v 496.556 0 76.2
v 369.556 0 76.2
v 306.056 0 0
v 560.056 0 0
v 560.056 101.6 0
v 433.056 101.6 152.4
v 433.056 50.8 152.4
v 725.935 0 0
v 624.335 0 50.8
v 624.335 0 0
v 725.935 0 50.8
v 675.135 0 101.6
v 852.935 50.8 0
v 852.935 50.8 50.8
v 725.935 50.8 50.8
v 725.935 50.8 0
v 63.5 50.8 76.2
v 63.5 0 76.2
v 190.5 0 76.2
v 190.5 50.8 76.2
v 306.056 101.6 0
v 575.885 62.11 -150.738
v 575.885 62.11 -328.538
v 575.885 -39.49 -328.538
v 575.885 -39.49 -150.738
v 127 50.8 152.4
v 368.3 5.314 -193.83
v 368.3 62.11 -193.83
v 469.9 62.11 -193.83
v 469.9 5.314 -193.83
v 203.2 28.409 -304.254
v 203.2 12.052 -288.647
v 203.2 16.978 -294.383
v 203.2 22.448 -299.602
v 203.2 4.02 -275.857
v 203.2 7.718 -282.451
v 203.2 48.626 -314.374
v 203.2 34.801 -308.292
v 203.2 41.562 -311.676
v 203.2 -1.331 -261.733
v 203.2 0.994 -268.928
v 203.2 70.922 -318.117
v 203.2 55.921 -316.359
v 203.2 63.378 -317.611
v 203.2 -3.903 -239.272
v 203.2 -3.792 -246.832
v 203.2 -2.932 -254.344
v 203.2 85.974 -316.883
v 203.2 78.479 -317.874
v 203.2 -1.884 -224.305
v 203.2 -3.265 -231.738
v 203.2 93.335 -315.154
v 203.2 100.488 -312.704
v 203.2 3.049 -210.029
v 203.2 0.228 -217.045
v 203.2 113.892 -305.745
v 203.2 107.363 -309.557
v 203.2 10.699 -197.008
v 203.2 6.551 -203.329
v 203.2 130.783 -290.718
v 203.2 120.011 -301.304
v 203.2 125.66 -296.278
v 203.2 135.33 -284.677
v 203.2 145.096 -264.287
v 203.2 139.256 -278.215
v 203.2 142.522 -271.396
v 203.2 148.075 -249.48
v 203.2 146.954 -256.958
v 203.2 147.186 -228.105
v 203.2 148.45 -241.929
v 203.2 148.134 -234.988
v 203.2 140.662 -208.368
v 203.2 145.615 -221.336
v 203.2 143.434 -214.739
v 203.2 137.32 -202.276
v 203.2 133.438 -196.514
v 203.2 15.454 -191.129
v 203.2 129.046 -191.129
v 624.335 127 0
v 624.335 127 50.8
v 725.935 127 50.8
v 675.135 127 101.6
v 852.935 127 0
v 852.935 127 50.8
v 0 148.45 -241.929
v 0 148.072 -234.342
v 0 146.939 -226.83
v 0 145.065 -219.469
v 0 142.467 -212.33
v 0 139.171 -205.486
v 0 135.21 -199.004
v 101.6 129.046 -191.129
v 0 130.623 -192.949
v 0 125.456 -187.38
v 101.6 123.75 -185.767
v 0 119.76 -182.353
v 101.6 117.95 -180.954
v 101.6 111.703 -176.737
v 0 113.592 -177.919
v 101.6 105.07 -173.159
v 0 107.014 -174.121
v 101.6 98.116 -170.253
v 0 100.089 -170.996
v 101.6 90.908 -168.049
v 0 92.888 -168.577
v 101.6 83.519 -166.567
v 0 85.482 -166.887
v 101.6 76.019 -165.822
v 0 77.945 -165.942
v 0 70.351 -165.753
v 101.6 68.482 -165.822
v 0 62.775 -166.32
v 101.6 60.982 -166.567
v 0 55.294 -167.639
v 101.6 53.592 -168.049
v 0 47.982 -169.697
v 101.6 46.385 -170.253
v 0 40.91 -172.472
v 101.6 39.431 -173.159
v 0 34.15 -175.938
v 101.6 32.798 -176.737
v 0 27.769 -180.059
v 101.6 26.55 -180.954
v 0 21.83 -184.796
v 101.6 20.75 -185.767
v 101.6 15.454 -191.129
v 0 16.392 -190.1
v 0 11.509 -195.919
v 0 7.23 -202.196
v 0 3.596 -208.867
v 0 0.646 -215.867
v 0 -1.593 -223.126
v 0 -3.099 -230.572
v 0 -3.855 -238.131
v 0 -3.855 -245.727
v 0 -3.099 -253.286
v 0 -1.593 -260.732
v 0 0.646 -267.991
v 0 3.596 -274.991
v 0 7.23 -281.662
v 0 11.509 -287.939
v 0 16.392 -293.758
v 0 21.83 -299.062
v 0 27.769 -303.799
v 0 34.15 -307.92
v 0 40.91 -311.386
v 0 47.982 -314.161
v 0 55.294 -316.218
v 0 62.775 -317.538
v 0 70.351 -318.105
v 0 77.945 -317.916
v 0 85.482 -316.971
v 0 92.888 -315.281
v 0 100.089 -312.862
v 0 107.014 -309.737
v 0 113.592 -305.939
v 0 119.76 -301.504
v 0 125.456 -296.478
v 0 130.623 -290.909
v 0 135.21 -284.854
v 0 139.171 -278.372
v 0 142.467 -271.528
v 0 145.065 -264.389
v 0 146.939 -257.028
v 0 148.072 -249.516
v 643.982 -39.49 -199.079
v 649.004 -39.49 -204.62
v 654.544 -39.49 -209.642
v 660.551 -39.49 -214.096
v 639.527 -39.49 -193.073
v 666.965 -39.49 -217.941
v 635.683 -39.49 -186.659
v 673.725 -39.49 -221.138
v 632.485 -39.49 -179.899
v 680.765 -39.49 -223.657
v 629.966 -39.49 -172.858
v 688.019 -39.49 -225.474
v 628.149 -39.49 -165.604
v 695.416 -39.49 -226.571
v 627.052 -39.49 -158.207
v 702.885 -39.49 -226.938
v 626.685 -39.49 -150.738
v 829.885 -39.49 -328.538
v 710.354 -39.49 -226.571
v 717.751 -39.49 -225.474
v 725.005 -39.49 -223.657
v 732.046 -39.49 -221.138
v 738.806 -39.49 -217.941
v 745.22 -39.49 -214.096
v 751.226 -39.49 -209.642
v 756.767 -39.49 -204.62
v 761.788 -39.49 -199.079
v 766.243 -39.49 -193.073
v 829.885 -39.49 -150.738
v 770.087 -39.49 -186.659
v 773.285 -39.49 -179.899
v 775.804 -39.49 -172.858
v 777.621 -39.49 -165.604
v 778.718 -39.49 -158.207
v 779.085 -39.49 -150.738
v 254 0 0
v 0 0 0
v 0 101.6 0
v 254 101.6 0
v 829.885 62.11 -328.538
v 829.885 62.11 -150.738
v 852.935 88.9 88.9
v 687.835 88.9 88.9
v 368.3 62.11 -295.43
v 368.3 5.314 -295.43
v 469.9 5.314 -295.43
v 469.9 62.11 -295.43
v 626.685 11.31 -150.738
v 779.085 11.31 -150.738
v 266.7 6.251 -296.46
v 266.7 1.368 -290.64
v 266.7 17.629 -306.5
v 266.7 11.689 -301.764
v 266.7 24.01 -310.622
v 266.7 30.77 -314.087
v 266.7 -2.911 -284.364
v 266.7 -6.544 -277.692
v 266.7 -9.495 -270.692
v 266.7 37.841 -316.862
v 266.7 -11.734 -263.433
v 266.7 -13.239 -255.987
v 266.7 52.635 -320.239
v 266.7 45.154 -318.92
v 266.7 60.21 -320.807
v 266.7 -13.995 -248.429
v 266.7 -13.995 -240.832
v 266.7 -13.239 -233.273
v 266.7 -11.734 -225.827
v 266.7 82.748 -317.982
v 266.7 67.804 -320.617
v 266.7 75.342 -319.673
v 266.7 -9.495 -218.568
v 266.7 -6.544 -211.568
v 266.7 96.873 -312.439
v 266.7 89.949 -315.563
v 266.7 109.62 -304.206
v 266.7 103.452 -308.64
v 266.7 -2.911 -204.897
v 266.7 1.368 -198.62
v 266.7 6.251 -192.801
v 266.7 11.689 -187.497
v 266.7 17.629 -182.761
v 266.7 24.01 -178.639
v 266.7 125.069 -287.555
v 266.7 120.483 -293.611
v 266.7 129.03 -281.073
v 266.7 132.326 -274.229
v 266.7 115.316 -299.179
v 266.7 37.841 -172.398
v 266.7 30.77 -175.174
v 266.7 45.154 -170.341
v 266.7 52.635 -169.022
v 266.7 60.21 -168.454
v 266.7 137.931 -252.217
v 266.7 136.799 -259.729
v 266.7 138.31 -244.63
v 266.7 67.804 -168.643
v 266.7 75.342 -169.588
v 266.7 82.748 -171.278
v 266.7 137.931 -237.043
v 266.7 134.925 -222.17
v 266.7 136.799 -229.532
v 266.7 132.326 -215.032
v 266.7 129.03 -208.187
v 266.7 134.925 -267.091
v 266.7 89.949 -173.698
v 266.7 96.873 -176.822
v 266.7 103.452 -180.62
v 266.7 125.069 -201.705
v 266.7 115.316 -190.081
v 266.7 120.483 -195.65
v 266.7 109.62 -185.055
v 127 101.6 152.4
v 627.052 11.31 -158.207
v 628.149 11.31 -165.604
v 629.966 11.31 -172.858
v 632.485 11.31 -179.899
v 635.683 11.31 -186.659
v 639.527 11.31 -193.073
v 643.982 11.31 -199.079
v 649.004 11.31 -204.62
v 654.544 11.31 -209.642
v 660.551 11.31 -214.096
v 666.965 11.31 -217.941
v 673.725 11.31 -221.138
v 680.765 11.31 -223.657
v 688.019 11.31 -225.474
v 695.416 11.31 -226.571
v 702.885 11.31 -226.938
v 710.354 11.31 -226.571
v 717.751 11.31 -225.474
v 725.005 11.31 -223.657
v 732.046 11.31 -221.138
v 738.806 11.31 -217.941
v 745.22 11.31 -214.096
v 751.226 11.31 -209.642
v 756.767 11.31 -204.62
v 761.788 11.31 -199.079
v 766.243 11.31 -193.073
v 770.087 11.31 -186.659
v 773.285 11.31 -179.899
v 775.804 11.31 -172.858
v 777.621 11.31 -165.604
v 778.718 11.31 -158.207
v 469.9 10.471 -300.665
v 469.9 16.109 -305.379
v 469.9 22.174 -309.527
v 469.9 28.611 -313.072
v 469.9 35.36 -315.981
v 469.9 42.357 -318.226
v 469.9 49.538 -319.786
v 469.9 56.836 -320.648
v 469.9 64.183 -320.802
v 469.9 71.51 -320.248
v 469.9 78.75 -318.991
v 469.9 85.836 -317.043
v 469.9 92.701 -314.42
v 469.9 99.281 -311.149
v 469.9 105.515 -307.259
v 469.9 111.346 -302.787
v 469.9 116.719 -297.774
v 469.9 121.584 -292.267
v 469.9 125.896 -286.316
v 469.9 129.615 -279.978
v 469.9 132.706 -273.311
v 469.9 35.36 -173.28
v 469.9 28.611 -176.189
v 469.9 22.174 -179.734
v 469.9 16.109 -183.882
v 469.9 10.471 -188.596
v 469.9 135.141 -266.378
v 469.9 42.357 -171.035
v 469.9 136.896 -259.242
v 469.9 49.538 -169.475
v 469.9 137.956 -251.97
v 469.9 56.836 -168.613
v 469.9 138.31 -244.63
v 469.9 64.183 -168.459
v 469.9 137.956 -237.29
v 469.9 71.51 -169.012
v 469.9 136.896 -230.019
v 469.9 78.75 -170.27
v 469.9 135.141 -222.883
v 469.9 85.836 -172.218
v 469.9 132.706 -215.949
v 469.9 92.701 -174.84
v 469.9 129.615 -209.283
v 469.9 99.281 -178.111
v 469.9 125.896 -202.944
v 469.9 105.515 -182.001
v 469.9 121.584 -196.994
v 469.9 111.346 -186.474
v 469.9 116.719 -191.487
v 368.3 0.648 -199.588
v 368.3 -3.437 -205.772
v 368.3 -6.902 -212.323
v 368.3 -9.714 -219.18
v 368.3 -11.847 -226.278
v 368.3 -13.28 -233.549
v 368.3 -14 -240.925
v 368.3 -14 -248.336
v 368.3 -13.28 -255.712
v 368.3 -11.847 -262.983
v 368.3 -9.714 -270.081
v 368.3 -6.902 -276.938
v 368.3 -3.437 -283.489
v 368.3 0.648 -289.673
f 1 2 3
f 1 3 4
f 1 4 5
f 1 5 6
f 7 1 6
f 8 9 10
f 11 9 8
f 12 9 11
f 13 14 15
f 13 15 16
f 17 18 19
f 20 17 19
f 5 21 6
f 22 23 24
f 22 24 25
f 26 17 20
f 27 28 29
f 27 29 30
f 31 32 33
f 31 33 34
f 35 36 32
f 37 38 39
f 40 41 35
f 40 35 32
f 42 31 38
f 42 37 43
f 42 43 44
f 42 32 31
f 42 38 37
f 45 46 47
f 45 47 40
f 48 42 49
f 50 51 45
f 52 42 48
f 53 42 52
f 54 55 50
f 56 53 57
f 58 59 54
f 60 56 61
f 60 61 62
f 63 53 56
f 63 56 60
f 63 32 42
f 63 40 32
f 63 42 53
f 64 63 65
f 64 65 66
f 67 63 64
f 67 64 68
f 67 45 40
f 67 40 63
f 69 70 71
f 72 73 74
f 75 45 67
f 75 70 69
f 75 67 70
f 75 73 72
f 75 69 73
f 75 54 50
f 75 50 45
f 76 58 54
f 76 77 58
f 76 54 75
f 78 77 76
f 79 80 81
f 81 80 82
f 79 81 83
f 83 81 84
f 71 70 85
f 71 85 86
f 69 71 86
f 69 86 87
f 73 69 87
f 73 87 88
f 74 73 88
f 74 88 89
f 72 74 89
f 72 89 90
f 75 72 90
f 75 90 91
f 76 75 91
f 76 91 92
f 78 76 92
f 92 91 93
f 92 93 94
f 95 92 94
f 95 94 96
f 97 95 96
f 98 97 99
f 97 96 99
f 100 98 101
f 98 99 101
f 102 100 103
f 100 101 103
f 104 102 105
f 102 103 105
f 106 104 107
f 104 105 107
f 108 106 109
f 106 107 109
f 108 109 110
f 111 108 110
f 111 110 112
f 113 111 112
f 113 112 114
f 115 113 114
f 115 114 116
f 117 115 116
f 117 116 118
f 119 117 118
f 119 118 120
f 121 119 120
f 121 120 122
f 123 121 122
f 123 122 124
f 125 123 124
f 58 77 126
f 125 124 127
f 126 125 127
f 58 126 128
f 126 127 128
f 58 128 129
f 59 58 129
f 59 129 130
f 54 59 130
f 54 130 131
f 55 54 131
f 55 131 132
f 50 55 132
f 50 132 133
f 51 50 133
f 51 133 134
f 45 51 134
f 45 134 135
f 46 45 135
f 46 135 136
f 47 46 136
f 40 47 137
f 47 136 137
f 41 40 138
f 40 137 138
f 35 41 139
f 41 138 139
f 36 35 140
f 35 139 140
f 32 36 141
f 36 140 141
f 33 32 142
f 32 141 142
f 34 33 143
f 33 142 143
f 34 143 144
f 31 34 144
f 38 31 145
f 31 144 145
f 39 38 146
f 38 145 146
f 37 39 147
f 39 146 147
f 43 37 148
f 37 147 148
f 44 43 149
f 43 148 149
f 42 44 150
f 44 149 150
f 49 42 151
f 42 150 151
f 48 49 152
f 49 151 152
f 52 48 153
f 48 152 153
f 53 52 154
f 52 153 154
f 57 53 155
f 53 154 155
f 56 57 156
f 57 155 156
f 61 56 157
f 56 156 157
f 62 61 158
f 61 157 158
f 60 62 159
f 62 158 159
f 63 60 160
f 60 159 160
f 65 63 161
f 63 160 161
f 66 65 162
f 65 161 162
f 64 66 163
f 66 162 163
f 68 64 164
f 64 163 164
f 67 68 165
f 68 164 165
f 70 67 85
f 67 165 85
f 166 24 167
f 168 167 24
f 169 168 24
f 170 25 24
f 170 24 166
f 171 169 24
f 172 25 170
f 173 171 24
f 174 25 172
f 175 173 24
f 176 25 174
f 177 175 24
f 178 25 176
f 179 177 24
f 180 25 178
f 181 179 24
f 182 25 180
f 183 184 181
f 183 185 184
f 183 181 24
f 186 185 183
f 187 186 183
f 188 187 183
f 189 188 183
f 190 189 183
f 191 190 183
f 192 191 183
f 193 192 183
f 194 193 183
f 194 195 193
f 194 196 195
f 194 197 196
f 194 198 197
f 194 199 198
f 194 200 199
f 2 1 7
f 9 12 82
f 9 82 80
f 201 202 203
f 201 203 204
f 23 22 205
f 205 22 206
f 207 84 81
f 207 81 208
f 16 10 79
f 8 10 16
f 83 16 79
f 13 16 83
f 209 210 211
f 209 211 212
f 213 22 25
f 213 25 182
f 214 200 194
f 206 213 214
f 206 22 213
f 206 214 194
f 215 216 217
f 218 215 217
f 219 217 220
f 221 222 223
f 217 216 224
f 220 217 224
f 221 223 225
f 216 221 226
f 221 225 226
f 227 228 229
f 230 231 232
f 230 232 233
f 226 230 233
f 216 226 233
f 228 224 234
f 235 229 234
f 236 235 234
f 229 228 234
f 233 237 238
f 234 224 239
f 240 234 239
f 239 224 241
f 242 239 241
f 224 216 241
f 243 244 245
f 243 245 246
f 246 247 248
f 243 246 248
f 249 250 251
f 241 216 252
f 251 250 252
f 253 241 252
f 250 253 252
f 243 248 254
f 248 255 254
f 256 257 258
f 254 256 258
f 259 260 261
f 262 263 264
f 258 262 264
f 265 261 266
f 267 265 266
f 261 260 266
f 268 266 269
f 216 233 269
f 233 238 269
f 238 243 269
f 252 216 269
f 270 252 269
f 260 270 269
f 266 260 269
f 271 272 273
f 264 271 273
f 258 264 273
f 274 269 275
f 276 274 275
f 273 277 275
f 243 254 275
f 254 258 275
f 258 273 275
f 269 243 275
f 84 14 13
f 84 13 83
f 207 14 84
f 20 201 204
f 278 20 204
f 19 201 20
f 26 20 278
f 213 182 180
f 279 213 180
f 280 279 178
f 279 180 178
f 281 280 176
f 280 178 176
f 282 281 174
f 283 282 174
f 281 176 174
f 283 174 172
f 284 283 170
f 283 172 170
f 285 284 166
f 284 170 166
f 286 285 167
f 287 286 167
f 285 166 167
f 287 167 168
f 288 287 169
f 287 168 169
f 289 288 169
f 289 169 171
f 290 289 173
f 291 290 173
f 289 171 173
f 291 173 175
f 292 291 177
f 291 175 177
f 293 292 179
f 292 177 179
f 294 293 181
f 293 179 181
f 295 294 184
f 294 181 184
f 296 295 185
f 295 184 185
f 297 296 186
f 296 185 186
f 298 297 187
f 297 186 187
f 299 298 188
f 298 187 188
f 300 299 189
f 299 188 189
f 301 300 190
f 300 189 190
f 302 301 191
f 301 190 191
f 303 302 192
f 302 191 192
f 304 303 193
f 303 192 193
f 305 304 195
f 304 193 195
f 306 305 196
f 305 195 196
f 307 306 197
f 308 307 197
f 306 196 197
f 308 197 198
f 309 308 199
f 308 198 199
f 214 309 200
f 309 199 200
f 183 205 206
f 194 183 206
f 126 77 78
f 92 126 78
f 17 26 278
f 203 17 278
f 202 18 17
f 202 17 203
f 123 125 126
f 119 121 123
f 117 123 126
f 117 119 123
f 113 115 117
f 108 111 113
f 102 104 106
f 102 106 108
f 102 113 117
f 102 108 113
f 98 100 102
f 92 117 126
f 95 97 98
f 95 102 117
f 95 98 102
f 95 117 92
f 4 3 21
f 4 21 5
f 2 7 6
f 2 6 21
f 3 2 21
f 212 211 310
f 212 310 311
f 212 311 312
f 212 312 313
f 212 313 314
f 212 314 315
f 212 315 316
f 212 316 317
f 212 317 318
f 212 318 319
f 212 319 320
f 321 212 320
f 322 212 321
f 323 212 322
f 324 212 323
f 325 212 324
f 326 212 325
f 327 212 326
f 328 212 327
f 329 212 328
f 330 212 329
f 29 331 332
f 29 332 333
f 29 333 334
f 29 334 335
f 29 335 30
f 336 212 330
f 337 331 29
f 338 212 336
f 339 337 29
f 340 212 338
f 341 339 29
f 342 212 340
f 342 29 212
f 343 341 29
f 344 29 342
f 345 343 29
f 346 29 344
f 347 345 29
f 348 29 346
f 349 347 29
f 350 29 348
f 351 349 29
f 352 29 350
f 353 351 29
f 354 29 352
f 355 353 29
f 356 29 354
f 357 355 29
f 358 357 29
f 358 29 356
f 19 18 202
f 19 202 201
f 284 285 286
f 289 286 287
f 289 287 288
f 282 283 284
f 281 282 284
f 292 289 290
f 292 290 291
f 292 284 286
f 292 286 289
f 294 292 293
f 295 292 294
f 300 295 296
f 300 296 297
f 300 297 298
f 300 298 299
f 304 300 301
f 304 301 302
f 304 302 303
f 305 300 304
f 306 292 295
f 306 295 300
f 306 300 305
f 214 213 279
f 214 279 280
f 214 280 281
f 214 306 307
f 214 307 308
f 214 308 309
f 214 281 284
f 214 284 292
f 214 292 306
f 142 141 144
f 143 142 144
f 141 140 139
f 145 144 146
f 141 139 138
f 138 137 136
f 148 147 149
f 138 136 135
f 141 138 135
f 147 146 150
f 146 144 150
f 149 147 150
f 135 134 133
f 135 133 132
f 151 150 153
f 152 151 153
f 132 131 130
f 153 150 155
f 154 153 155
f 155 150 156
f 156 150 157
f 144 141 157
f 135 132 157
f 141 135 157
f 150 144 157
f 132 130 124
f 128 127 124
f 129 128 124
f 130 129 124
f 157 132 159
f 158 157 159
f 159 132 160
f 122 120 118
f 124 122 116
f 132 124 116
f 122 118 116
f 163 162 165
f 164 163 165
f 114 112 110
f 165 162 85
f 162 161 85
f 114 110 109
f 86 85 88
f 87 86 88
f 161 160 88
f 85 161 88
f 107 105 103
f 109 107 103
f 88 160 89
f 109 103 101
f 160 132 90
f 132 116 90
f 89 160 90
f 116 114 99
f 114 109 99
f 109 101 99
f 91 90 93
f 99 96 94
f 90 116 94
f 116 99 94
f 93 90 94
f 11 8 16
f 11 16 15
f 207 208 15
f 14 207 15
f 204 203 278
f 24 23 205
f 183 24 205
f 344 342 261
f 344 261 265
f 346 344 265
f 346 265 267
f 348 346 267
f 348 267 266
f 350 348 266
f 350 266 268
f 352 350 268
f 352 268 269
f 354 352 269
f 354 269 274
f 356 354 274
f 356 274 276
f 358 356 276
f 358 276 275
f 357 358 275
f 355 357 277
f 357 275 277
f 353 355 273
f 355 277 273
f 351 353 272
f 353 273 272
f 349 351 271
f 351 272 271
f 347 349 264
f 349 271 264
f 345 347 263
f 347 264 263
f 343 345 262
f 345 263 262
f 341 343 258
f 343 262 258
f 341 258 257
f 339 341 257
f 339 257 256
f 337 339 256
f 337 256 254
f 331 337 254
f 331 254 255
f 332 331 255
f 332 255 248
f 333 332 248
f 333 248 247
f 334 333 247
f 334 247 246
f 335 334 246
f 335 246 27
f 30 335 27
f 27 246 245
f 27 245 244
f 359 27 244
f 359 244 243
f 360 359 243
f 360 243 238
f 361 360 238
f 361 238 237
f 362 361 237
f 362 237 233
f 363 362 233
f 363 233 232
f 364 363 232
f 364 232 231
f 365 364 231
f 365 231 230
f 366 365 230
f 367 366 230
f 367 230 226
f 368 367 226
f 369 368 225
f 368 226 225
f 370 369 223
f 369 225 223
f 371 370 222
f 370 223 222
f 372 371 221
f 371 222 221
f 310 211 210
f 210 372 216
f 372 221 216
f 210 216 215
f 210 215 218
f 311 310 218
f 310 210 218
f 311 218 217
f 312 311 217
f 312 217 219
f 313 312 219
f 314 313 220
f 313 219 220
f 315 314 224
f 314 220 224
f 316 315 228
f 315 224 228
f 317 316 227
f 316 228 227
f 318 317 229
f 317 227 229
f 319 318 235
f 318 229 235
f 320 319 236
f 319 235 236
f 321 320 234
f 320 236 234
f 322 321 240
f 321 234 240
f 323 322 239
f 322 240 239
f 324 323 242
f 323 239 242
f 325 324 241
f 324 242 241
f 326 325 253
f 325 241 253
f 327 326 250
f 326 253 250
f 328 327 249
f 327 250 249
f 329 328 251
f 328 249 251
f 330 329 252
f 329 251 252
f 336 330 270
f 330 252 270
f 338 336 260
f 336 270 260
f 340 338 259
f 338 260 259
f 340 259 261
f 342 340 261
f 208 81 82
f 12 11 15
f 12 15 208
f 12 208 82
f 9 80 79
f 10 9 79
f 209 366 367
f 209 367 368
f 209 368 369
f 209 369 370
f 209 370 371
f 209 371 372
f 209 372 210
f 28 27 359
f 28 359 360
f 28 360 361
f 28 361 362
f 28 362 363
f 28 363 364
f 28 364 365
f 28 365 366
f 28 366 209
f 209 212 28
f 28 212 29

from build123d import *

# Parameters (mm, degrees)
F1_DEPTH  = 101.6
F3_DEPTH  = 50.8
F5_DEPTH  = 101.6
F9_DEPTH  = 63.5
F11_DEPTH = 127
F15_R     = 76.2
F16_DEPTH = 203.2
F18_DEPTH = 101.6
F20_R     = 76.2
F21_DEPTH = 203.2
F23_DEPTH = 101.6
F24_W     = 254
F24_H     = 177.8
F25_DEPTH = 101.6
F27_DEPTH = 50.8


# Not quite as in the source:
# - a feature names something its author has since deleted; it is built from what else it names


with BuildPart() as f1:
    # F0 (on Front) → F1 (new body)
    with BuildSketch(Plane.XZ):
        Polygon((63.5, 76.2), (190.5, 76.2), (127, 152.4), align=None)
        Polygon((0, 0), (254, 0), (190.5, 76.2), (63.5, 76.2), align=None)
    extrude(amount=-F1_DEPTH)

    # F2 (on face) → F3 (cut)
    with BuildSketch(Plane.XZ):
        Polygon((127, 76.2), (127, 152.4), (63.5, 76.2), align=None)
        Polygon((190.5, 76.2), (127, 152.4), (127, 76.2), align=None)
    extrude(amount=-F3_DEPTH, mode=Mode.SUBTRACT)


with BuildPart() as f5:
    # F4 (on face) → F5 (new body)
    with BuildSketch(Plane.XZ):
        Polygon((306.055911541, 0), (560.055911541, 0), (433.055911541, 152.4), align=None)
    extrude(amount=-F5_DEPTH)

    # F8 (on 3pt) → F9 (cut, symmetric)
    with BuildSketch(Plane.YZ.offset(433.055911541)):
        Polygon((50.8, 152.4), (0, 152.4), (0, 76.2), align=None)
    extrude(amount=F9_DEPTH, both=True, mode=Mode.SUBTRACT)


with BuildPart() as f11:
    # F10 (on face) → F11 (new body)
    with BuildSketch(Plane.XZ):
        Polygon((675.1348665619, 101.6), (624.3348665619, 50.8), (624.3348665619, 0), (725.9348665619, 0), (725.9348665619, 50.8), align=None)
    extrude(amount=-F11_DEPTH)

    # F13 (on offset) → F14 (join, up to the next surface of F11)
    with BuildSketch(Plane.YZ.offset(852.9348665619)):
        Polygon((50.8, 50.8), (50.8, 0), (127, 0), (127, 50.8), (88.9, 88.9), align=None)
    extrude(until=Until.NEXT, dir=(-1, 0, 0))


with BuildPart() as f16:
    # F15 (on Right) → F16 (new body)
    with BuildSketch(Plane.YZ):
        with Locations((72.2502991557, -241.928935051)):
            Circle(F15_R)
    extrude(amount=F16_DEPTH)

    # F17 (on face) → F18 (cut)
    with BuildSketch(Plane.YZ.offset(203.2)):
        with BuildLine():
            ThreePointArc((129.0464257842, -191.128935051), (72.2502991557, -165.728935051), (15.4541725272, -191.128935051))
            Line((15.4541725272, -191.128935051), (129.0464257842, -191.128935051))
        make_face()
    extrude(amount=-F18_DEPTH, mode=Mode.SUBTRACT)


with BuildPart() as f21:
    # F20 (on offset) → F21 (new body)
    with BuildSketch(Plane.YZ.offset(266.7)):
        with Locations((62.1099583805, -244.6303920269)):
            Circle(F20_R)
    extrude(amount=F21_DEPTH)

    # F22 (on face) → F23 (cut)
    with BuildSketch(Plane.YZ.offset(469.9)):
        with BuildLine():
            Line((5.313831752, -295.4303920269), (62.1099583805, -295.4303920269))
            Line((62.1099583805, -295.4303920269), (62.1099583805, -244.6303920269))
            Line((62.1099583805, -244.6303920269), (62.1099583805, -193.8303920269))
            Line((62.1099583805, -193.8303920269), (5.313831752, -193.8303920269))
            ThreePointArc((5.313831752, -193.8303920269), (-14.0900416195, -244.6303920269), (5.313831752, -295.4303920269))
        make_face()
    extrude(amount=-F23_DEPTH, mode=Mode.SUBTRACT)


with BuildPart() as f25:
    # F24 (on face) → F25 (new body)
    with BuildSketch(Plane.XZ.offset(-62.1099583805)):
        with Locations((702.8850913048, -239.6382312099)):
            Rectangle(F24_W, F24_H)
    extrude(amount=F25_DEPTH)

    # F26 (on face) → F27 (cut)
    with BuildSketch(Plane.XZ.offset(39.4900416195)):
        with BuildLine():
            Line((779.0850913048, -150.7382312099), (626.6850913048, -150.7382312099))
            ThreePointArc((626.6850913048, -150.7382312099), (702.8850913048, -226.9382312099), (779.0850913048, -150.7382312099))
        make_face()
    extrude(amount=-F27_DEPTH, mode=Mode.SUBTRACT)


solid = Compound([f1.part, f5.part, f11.part, f16.part, f21.part, f25.part])
